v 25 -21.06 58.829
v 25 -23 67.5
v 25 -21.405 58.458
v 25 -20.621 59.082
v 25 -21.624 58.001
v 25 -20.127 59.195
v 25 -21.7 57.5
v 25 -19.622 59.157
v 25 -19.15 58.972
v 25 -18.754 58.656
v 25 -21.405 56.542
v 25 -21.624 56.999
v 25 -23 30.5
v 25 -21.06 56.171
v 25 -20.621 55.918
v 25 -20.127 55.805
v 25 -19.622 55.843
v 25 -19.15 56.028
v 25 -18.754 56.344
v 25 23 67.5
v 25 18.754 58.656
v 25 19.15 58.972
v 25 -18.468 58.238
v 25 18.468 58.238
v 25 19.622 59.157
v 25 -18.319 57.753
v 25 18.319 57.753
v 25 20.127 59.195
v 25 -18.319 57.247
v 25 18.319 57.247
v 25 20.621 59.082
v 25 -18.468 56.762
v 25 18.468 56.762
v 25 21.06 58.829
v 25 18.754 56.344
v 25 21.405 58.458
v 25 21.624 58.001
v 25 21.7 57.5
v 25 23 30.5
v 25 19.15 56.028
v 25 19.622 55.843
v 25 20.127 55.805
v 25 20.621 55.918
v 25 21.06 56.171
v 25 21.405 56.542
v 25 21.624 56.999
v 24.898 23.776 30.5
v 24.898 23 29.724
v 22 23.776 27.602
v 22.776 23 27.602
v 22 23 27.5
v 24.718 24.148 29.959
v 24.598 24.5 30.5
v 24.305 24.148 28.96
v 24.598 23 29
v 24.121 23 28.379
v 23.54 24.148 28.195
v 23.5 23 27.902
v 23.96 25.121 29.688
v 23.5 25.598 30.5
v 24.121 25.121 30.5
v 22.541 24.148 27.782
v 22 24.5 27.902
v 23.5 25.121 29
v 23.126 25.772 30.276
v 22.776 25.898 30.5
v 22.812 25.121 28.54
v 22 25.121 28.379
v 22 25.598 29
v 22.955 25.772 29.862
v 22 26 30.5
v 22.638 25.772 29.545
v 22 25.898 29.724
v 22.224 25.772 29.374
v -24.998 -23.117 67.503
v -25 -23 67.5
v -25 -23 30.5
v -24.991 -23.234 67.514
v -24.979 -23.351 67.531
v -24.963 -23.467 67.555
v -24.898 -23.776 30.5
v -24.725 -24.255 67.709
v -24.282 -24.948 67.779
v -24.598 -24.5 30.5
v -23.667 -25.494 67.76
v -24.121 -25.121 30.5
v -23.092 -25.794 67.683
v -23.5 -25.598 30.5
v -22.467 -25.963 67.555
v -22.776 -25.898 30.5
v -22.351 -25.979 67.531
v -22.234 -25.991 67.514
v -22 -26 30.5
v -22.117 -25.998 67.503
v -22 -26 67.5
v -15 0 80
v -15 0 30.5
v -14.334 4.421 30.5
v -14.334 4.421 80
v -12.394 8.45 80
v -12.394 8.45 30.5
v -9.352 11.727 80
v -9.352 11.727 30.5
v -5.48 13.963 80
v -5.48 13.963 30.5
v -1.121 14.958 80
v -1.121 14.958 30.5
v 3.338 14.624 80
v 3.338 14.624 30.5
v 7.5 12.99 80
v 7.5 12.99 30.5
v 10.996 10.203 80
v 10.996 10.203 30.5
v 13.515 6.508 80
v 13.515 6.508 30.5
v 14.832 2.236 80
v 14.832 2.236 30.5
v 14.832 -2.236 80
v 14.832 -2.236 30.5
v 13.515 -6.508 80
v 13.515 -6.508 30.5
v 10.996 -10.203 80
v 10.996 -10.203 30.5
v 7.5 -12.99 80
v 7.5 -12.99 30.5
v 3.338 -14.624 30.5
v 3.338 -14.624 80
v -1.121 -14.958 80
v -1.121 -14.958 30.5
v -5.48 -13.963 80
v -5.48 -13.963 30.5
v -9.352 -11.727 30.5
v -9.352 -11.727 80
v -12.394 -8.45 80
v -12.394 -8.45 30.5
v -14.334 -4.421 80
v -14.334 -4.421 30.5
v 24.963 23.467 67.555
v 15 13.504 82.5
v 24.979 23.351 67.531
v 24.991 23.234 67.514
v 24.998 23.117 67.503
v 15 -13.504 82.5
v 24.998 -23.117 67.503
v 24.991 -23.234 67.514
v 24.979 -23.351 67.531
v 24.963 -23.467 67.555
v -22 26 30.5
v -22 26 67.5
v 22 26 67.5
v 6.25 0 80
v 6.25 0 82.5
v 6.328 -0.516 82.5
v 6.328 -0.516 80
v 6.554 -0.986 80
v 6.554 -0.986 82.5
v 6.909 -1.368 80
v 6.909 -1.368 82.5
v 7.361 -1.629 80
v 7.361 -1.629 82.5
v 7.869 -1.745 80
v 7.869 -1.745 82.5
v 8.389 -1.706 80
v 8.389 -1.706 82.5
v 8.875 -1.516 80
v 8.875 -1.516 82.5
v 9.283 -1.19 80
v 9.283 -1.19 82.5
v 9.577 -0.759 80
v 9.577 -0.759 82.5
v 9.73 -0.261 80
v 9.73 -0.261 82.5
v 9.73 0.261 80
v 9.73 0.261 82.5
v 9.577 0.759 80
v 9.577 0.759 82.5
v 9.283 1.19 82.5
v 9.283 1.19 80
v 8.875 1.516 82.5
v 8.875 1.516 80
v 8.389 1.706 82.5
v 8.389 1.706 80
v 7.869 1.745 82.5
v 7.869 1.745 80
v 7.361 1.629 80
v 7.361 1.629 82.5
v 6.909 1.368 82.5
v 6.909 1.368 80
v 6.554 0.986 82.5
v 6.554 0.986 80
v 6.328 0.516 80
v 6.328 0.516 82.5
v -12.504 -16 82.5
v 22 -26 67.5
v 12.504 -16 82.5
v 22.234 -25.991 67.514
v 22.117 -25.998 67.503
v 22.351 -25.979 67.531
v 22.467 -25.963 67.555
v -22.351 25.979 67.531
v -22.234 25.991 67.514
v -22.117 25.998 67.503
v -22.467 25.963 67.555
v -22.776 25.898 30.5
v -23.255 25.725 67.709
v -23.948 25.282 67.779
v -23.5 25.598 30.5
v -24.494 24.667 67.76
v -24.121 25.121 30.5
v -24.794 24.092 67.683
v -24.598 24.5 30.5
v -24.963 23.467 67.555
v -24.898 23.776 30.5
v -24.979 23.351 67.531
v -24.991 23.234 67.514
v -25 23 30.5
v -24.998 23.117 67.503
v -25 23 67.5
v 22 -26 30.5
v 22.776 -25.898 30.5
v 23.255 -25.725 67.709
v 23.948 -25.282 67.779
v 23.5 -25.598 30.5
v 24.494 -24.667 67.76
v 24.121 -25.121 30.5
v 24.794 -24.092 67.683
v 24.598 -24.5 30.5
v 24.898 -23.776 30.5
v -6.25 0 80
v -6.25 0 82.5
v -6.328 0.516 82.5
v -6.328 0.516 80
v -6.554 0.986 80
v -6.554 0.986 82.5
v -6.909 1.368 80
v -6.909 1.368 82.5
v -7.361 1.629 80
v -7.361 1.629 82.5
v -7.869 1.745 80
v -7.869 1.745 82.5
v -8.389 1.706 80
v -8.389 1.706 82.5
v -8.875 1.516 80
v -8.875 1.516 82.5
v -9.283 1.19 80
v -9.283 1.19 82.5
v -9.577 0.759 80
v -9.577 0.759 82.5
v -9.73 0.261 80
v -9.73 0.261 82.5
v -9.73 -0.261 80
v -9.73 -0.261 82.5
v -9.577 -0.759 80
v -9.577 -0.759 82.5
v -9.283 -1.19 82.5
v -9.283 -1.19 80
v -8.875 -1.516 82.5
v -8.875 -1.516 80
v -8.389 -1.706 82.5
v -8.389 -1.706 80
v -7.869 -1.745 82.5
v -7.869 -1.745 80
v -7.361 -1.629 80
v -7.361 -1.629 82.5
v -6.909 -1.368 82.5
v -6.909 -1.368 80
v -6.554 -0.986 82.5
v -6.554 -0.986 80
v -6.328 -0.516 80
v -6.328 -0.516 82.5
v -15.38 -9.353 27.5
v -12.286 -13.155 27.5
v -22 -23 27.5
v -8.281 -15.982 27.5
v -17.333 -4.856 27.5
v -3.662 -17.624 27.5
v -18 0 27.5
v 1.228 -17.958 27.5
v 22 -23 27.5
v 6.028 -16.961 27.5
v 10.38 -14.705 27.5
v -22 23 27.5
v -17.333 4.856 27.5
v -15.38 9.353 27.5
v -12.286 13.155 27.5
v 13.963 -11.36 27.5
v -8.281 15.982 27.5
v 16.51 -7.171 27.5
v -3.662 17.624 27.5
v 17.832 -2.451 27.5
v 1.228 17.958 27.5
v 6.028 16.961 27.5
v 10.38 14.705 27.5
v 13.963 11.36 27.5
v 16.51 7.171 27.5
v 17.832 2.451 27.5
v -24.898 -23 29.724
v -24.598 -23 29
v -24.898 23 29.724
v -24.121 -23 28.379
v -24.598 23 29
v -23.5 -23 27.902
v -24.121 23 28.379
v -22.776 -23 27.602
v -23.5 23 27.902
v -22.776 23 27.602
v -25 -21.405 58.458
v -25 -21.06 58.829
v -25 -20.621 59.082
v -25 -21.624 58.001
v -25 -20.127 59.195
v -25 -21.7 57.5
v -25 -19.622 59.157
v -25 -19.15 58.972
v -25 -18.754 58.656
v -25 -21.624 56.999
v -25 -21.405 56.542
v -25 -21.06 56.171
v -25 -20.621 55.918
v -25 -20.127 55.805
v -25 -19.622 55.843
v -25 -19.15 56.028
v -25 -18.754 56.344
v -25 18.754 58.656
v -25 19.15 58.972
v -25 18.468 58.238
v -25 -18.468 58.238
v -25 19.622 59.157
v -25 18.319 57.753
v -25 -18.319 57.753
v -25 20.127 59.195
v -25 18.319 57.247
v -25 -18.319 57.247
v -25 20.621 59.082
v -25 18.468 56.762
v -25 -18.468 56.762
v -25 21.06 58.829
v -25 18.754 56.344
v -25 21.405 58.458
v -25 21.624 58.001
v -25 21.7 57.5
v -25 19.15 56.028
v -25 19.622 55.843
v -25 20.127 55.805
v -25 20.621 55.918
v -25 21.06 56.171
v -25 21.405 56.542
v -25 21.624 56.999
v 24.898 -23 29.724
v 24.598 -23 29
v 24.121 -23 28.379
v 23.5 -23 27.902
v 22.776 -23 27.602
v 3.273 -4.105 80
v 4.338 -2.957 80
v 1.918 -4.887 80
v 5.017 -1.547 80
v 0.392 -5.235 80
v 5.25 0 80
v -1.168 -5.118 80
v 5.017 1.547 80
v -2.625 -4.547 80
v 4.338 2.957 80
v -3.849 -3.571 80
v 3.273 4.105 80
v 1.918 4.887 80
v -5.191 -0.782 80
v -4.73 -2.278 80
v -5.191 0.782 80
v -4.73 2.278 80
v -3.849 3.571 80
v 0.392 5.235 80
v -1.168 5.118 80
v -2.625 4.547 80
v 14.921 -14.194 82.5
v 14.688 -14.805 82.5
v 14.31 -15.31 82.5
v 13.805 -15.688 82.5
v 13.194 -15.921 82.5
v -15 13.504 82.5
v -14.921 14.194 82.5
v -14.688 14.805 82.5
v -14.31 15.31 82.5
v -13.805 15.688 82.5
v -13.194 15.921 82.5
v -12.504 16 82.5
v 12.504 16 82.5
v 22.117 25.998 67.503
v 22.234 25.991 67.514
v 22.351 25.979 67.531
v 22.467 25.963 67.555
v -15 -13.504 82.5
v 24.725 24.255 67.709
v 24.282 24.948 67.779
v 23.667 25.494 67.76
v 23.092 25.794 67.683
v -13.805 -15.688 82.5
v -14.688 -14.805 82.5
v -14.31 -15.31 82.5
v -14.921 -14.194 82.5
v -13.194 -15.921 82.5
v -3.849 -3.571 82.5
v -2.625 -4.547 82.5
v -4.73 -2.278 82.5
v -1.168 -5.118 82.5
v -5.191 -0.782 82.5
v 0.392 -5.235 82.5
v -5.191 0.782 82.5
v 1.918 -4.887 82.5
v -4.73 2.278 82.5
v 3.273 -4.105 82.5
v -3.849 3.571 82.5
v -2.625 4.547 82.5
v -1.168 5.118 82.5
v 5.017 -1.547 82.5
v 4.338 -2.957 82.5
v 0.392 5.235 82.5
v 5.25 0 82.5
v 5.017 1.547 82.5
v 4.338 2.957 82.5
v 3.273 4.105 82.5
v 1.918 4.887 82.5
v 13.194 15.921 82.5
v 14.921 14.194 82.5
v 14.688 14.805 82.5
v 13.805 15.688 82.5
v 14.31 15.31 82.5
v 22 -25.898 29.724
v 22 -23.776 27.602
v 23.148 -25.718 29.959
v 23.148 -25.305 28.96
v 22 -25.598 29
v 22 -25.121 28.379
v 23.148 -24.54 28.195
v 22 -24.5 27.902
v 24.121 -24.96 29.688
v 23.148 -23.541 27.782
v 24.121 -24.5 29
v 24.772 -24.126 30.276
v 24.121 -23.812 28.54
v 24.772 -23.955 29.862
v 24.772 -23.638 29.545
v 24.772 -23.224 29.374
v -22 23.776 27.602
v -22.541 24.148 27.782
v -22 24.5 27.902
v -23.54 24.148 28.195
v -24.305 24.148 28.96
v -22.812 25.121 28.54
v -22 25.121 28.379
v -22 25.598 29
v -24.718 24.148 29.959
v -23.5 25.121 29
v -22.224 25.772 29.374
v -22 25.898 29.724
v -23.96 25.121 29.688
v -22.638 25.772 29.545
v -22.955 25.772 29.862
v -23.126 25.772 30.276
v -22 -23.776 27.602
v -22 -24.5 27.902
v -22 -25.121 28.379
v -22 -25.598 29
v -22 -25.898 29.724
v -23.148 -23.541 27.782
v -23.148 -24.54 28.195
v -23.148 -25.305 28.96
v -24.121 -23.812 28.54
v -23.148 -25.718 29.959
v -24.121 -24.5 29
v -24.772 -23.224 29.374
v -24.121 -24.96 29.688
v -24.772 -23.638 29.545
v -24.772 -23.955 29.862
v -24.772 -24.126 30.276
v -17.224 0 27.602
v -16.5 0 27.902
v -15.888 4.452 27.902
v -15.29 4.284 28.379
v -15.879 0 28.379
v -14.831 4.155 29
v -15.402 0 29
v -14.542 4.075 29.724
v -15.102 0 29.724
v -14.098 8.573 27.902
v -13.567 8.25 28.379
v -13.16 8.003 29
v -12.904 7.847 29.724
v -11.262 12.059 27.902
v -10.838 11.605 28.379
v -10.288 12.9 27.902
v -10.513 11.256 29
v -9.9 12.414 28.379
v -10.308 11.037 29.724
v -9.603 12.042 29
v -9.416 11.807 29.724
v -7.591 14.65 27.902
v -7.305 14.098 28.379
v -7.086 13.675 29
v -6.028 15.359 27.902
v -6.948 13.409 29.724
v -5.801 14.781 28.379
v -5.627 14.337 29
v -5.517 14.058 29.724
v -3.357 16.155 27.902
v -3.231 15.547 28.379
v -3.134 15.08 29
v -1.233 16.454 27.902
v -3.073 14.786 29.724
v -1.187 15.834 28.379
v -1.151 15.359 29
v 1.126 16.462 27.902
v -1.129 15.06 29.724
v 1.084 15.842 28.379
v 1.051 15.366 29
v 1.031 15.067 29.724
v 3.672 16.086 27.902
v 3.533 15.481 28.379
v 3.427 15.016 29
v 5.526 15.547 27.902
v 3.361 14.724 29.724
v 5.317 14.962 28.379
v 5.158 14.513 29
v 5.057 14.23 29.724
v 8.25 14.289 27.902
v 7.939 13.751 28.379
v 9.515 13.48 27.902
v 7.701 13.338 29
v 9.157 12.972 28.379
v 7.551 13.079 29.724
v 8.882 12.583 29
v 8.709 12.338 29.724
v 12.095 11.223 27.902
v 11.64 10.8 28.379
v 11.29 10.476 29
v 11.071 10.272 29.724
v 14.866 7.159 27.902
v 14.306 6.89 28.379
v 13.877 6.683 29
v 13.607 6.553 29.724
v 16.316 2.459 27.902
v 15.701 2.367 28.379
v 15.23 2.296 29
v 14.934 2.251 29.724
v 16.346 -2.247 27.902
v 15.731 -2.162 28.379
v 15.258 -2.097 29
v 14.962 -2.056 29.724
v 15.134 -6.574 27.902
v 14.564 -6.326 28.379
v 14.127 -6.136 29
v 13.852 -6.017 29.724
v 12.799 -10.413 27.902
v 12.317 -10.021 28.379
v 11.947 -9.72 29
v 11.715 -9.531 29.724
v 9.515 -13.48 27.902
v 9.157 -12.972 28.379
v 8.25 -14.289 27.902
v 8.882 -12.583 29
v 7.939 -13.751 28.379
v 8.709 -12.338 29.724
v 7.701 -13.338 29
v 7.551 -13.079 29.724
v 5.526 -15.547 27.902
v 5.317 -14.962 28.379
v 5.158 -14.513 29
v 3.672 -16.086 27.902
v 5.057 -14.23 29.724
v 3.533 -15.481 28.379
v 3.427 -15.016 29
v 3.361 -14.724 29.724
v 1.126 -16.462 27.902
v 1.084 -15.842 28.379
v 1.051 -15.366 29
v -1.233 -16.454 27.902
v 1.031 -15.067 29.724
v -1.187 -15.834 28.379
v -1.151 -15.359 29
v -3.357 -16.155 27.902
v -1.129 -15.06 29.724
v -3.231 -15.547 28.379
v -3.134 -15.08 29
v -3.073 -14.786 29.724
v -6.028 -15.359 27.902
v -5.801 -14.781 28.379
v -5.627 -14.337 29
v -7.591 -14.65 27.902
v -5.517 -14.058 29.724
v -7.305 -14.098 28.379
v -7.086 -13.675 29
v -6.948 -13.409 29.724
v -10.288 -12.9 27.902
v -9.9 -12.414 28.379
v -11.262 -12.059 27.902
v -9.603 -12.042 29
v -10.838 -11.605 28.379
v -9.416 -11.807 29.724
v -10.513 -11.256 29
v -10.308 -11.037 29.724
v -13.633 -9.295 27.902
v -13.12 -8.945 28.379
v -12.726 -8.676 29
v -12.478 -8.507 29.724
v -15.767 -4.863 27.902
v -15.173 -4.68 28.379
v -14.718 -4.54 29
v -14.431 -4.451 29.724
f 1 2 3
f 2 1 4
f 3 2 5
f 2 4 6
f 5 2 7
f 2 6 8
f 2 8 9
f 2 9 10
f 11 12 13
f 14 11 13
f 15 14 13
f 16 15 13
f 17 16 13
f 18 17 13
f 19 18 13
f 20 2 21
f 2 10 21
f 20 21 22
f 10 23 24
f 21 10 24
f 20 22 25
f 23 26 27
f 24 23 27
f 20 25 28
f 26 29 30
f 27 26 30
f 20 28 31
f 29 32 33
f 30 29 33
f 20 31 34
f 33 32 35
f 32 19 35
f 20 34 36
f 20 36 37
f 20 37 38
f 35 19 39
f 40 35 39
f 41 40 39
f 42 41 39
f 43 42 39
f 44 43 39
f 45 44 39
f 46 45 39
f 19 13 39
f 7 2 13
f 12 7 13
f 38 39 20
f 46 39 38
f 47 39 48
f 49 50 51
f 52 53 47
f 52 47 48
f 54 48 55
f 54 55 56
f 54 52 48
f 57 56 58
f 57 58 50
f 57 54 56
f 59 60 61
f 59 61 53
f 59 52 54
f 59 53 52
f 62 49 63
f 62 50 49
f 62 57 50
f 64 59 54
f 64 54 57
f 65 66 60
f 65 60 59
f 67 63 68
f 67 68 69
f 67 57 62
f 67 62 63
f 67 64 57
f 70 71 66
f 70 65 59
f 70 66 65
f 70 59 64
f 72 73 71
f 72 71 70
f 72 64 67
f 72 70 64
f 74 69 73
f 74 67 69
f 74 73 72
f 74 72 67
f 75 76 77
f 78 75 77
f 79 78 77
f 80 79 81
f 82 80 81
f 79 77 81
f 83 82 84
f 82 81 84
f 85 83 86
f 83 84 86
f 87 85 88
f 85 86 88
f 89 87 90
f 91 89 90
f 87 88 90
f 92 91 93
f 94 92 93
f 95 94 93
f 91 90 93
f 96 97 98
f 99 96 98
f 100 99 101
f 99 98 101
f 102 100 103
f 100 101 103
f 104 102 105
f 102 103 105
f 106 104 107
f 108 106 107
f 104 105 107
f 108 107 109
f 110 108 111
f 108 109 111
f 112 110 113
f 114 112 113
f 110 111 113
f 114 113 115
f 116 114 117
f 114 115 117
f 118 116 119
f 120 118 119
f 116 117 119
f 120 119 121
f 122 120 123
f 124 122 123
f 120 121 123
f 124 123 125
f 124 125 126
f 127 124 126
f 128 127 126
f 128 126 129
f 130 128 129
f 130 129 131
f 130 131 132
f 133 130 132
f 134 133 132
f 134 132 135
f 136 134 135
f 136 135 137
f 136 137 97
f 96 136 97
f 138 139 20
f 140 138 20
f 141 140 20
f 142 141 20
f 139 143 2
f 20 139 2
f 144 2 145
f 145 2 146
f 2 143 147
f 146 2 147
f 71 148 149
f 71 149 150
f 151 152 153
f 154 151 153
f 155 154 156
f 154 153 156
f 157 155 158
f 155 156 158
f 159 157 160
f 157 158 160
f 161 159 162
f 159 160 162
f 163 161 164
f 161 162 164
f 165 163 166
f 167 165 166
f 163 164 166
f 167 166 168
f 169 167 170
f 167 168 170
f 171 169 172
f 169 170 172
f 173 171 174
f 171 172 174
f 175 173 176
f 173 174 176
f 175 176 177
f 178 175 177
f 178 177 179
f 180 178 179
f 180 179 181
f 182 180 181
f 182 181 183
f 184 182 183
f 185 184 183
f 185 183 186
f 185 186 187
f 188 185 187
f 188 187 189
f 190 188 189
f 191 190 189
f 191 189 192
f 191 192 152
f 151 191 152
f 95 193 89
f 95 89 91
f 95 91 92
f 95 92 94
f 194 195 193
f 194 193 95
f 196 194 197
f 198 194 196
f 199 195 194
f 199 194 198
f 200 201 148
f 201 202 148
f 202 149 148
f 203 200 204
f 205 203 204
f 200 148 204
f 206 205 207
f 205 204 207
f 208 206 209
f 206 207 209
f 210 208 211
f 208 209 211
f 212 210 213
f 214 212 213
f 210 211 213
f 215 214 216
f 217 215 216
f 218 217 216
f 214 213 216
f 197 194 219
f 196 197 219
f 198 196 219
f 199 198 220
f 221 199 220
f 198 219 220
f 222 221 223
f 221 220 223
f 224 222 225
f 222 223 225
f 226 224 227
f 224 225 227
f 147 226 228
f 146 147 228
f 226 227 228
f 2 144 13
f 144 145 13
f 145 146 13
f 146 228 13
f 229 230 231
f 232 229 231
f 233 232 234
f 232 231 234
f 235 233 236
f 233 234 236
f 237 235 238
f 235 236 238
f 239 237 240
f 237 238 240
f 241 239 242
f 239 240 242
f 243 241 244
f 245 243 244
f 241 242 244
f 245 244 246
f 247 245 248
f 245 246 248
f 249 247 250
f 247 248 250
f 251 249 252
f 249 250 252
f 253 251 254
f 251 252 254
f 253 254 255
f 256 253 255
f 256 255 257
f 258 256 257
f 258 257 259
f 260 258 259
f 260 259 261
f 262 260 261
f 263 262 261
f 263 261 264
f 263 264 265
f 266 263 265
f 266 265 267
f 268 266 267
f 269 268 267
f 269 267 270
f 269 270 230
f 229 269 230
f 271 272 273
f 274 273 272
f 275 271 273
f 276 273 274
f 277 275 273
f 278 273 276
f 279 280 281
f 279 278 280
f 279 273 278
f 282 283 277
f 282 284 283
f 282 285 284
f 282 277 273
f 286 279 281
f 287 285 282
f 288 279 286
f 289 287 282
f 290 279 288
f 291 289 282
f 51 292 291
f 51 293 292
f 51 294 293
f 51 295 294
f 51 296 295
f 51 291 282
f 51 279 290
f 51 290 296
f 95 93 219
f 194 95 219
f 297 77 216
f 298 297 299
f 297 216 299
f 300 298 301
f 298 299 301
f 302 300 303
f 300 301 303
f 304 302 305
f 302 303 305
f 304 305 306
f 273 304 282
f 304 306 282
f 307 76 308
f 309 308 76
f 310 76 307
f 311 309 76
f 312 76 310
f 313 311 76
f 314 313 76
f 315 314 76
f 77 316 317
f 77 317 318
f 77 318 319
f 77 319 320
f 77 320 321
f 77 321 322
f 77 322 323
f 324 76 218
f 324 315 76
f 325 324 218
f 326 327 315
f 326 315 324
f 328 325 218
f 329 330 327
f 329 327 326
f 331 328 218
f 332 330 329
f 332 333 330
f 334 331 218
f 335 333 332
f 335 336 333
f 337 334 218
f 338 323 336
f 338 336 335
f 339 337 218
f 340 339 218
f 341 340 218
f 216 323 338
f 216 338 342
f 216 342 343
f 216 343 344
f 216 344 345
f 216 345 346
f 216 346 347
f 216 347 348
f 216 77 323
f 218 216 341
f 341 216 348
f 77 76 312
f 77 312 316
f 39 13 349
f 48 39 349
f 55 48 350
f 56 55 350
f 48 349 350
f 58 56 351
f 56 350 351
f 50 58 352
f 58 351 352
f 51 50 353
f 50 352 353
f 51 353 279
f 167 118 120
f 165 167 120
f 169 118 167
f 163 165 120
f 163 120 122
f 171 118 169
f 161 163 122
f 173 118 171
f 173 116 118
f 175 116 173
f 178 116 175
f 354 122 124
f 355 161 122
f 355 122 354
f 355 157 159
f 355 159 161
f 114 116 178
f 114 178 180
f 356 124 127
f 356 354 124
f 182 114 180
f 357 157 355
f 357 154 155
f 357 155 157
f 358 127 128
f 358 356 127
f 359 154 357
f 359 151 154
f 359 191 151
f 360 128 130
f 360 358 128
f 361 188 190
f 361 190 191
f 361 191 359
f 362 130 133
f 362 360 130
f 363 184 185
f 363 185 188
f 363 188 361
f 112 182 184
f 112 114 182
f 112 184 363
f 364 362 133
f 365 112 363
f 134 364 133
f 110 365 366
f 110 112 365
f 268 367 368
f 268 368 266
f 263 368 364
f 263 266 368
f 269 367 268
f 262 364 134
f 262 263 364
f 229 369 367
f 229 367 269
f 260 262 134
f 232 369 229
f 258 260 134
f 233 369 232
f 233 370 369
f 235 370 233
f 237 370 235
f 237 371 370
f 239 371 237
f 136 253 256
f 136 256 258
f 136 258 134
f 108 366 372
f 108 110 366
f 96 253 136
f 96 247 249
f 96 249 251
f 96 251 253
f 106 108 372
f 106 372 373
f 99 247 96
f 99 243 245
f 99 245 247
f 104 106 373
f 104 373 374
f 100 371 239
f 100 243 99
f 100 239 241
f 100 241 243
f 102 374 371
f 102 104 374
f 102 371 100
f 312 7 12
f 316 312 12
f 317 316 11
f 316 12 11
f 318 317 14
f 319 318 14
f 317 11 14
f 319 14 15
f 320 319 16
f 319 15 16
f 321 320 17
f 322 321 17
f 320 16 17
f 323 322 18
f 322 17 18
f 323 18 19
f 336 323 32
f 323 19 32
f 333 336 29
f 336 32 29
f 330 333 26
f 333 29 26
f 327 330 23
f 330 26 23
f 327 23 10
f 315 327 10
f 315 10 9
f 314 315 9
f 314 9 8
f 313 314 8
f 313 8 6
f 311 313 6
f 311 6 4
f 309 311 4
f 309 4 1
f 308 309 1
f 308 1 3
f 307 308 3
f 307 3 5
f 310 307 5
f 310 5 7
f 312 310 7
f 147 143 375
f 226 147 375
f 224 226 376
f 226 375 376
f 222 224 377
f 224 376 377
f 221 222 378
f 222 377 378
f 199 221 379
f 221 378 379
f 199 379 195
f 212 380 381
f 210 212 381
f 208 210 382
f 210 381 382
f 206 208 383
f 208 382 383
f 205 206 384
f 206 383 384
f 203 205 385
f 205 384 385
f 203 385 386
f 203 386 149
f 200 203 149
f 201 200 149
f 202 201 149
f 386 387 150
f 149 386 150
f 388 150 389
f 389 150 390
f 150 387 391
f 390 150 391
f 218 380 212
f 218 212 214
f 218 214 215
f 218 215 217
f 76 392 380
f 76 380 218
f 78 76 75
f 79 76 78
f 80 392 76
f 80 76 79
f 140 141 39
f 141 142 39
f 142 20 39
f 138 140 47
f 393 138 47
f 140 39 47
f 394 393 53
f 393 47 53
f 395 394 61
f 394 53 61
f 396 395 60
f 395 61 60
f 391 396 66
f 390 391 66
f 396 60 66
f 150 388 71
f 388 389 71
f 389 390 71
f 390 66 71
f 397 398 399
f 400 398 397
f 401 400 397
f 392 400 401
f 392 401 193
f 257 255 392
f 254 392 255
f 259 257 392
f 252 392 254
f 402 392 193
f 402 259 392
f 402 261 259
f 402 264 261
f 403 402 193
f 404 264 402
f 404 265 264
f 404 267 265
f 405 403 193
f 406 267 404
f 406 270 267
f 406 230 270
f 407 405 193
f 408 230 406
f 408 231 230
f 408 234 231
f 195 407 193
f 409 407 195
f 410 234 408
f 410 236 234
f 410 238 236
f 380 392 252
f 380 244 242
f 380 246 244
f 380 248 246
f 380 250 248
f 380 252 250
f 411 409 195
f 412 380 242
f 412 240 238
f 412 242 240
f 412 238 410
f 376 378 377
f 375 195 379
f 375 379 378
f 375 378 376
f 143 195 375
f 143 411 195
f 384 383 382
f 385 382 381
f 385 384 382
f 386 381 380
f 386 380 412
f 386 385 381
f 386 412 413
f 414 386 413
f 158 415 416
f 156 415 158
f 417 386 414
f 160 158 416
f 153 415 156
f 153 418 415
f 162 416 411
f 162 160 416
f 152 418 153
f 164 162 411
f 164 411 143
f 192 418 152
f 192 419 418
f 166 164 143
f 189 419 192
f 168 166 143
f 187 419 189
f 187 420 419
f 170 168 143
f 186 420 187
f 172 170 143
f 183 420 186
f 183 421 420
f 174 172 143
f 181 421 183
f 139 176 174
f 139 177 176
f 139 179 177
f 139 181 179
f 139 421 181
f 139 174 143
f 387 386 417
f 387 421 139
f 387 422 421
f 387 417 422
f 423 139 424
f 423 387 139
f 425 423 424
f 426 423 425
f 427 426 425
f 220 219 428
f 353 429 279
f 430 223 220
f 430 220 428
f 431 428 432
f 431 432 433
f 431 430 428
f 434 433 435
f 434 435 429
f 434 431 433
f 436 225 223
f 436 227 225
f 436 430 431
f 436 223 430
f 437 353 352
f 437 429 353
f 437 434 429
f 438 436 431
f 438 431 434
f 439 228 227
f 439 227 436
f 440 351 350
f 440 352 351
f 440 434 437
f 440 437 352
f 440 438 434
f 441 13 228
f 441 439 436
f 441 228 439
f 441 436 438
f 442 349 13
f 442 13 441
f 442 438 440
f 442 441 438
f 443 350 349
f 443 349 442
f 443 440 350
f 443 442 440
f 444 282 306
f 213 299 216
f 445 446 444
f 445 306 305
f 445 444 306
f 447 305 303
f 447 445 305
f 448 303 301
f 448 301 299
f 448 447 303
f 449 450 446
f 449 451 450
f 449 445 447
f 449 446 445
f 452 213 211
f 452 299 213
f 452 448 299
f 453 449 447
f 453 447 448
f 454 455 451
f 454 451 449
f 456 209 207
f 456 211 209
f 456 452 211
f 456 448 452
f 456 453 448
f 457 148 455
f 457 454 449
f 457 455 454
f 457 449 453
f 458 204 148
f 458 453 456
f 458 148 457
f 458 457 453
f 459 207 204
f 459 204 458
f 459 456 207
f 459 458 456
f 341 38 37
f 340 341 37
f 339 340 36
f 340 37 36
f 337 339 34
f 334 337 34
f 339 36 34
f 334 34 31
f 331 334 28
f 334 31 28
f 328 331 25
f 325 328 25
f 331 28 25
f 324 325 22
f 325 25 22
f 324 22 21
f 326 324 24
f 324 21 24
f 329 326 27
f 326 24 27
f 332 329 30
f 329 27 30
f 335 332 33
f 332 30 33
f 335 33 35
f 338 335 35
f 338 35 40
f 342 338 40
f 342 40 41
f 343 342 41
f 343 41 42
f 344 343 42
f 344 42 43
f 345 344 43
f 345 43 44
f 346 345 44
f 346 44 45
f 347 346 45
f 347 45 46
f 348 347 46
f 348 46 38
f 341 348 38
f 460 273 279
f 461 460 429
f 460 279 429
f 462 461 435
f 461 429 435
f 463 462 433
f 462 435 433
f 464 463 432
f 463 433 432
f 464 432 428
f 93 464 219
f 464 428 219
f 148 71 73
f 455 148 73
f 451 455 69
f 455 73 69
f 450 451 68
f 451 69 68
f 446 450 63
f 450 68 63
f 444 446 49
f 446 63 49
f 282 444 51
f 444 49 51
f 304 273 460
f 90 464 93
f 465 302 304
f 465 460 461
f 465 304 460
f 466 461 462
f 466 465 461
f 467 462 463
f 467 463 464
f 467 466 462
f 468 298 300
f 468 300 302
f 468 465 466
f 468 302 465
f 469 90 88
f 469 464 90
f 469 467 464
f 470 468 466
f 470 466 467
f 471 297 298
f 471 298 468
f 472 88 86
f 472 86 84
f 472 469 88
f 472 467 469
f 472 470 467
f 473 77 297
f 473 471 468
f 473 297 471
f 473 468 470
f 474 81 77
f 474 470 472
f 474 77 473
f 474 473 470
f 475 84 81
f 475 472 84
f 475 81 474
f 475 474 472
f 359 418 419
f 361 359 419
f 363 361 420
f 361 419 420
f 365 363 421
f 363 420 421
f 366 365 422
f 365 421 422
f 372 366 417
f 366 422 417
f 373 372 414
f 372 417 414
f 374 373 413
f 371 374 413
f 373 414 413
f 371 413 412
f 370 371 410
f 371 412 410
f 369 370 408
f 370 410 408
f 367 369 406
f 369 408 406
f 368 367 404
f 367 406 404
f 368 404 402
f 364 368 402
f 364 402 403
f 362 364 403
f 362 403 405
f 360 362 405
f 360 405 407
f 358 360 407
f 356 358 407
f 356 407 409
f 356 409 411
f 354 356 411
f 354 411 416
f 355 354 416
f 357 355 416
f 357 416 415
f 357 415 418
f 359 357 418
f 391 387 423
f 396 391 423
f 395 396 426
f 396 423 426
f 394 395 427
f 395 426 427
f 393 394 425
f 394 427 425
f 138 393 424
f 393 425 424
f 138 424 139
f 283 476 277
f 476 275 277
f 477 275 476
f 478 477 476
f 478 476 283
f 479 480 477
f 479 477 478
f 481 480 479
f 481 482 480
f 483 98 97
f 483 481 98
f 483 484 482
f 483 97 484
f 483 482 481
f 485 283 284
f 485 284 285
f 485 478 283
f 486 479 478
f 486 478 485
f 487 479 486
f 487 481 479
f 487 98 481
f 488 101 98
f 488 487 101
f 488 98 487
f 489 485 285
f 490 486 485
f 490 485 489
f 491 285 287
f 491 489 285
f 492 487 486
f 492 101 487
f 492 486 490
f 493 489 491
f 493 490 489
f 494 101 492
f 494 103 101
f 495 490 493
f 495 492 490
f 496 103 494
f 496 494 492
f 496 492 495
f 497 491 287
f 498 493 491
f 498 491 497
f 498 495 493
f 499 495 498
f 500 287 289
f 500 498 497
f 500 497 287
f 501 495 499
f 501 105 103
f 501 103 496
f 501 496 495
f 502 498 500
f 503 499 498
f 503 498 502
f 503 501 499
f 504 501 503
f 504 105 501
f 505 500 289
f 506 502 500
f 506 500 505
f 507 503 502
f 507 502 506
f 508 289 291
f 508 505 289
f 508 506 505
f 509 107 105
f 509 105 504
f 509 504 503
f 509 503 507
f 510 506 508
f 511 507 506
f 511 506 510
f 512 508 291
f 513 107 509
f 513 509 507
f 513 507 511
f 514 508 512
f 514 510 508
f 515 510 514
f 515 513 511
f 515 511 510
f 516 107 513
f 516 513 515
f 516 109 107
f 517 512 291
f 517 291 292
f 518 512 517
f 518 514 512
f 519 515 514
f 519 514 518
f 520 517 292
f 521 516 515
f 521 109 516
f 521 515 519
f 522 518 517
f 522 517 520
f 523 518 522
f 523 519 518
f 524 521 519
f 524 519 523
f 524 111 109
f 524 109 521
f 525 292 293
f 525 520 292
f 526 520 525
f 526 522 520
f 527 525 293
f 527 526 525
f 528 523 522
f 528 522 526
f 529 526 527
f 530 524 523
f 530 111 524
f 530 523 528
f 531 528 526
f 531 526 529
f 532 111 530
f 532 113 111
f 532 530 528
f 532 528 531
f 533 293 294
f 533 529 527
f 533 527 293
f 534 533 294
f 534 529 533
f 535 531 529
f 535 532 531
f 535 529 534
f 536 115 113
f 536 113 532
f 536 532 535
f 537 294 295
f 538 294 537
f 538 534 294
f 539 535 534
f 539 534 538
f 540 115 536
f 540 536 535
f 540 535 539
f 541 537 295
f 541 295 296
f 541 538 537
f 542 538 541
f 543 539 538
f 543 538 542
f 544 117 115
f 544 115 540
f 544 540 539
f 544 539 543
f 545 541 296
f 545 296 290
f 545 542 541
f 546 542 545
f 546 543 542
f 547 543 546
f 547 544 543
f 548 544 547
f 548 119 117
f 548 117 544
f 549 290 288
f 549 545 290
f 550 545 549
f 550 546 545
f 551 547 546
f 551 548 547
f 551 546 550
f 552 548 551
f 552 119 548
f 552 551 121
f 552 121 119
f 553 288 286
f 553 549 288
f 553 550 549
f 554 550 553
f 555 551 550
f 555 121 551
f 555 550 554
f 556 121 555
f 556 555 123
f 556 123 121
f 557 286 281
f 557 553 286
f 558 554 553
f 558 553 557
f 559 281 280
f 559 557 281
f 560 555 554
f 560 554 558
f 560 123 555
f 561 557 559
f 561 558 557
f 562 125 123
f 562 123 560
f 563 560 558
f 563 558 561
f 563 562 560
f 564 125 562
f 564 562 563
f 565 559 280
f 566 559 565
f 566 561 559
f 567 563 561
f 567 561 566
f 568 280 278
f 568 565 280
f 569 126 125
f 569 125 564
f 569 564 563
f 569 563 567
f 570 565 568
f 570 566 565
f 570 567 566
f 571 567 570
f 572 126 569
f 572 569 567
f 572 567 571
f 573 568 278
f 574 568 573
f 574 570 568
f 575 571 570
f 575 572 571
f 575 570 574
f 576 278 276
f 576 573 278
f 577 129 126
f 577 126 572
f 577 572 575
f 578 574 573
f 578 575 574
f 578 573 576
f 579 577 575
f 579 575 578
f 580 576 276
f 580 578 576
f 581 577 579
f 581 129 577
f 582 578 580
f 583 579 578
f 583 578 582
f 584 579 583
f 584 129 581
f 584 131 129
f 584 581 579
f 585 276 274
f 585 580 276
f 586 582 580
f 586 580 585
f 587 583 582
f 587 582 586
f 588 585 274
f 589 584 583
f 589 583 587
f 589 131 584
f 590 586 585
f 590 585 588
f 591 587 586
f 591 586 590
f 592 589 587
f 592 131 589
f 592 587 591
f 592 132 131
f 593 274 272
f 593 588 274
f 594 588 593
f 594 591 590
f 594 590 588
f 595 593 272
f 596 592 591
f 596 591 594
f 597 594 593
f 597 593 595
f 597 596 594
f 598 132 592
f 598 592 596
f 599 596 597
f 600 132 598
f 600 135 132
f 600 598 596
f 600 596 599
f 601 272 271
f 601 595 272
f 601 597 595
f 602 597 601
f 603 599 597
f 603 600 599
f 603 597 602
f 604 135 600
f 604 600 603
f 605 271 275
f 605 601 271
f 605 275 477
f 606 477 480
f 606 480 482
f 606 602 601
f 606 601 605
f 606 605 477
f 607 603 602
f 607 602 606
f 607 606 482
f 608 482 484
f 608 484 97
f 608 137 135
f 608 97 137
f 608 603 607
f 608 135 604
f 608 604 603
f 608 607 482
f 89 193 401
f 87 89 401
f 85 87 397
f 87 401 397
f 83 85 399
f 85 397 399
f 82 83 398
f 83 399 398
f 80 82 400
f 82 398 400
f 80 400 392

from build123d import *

# Parameters (mm, degrees)
SKETCH1_W           = 50
SKETCH1_H           = 52
BOSS_EXTRUDE1_DEPTH = 82.5
SKETCH2_R           = 15
CUT_EXTRUDE1_DEPTH  = 80
SKETCH3_R           = 5.25
SKETCH3_R_2         = 1.75
CUT_EXTRUDE2_DEPTH  = 91.040268769
SKETCH4_R           = 1.7
CUT_EXTRUDE4_DEPTH  = 100.911210582
SKETCH6_W           = 27.5
SKETCH6_H           = 52
CUT_EXTRUDE5_DEPTH  = 100.911210582
CUT_EXTRUDE6_DEPTH  = 100.911210582
CUT_EXTRUDE7_DEPTH  = 101.673978763
FILLET1_R           = 3


with BuildPart() as part:
    # Sketch1 → Boss-Extrude1 (new body)
    with BuildSketch(Plane.XY):
        Rectangle(SKETCH1_W, SKETCH1_H)
    extrude(amount=BOSS_EXTRUDE1_DEPTH)

    # Sketch2 → Cut-Extrude1 (cut)
    with BuildSketch(Plane(origin=(0, 0, 0), x_dir=(-1, 0, 0), z_dir=(0, 0, -1))):
        Circle(SKETCH2_R)
    extrude(amount=-CUT_EXTRUDE1_DEPTH, mode=Mode.SUBTRACT)

    # Sketch3 → Cut-Extrude2 (cut, through all)
    with BuildSketch(Plane.XY.offset(82.5)):
        Circle(SKETCH3_R)
        with Locations((-8, 0)):
            Circle(SKETCH3_R_2)
        with Locations(Location((8, 0, 0), (0, 0, 180))):
            Circle(SKETCH3_R_2)
    extrude(amount=-CUT_EXTRUDE2_DEPTH, mode=Mode.SUBTRACT)

    # Sketch4 → Cut-Extrude4 (cut, through all)
    with BuildSketch(Plane(origin=(25, 0, 0), x_dir=(0, 0, -1), z_dir=(1, 0, 0))):
        with Locations(Location((-57.5, 20, 0), (0, 0, 90))):
            Circle(SKETCH4_R)
        with Locations(Location((-57.5, -20, 0), (0, 0, 270))):
            Circle(SKETCH4_R)
    extrude(amount=-CUT_EXTRUDE4_DEPTH, mode=Mode.SUBTRACT)

    # Sketch6 → Cut-Extrude5 (cut, through all)
    with BuildSketch(Plane(origin=(25, 0, 0), x_dir=(0, 0, -1), z_dir=(1, 0, 0))):
        with Locations((-13.75, 0)):
            Rectangle(SKETCH6_W, SKETCH6_H)
    extrude(amount=-CUT_EXTRUDE5_DEPTH, mode=Mode.SUBTRACT)

    # Sketch9 → Cut-Extrude6 (cut, through all)
    with BuildSketch(Plane(origin=(25, 0, 0), x_dir=(0, 0, -1), z_dir=(1, 0, 0))):
        Polygon((-82.5, 26), (-82.5, 16), (-67.5, 26), align=None)
        Polygon((-82.5, -16), (-67.5, -26), (-82.5, -26), align=None)
    extrude(amount=-CUT_EXTRUDE6_DEPTH, mode=Mode.SUBTRACT)

    # Sketch10 → Cut-Extrude7 (cut, through all)
    with BuildSketch(Plane.XZ.offset(26)):
        Polygon((15, 82.5), (25, 67.5), (25, 82.5), align=None)
        Polygon((-25, 67.5), (-25, 82.5), (-15, 82.5), align=None)
    extrude(amount=-CUT_EXTRUDE7_DEPTH, mode=Mode.SUBTRACT)

    # Fillet1
    # the kernel refuses this fillet: 3 mm, written as the material it takes off along each edge
    with BuildSketch(Plane(origin=(-22, 23, 30.5), x_dir=(-1, 0, 0), z_dir=(0, 1, 0))) as fillet1_piece_1_section:
        Polygon((0, 0), (FILLET1_R, 0), (FILLET1_R, -FILLET1_R), (0, -FILLET1_R), align=None)
    fillet1_piece_1 = extrude(amount=FILLET1_R, mode=Mode.PRIVATE)
    fillet1_piece_1 = fillet1_piece_1 - Plane(origin=(-22, 23, 30.5), x_dir=(0.7071067811865475, 0, 0.7071067811865475), z_dir=(0, 1, 0)) * Sphere(FILLET1_R, mode=Mode.PRIVATE)
    add(fillet1_piece_1, mode=Mode.SUBTRACT)
    with BuildSketch(Plane(origin=(-22, -23, 30.5), x_dir=(0, 0, -1), z_dir=(-1, 0, 0))) as fillet1_piece_2_section:
        Polygon((0, 0), (FILLET1_R, 0), (FILLET1_R, FILLET1_R), (0, FILLET1_R), align=None)
    fillet1_piece_2 = extrude(amount=FILLET1_R, mode=Mode.PRIVATE)
    fillet1_piece_2 = fillet1_piece_2 - Plane(origin=(-22, -23, 30.5), x_dir=(0, 0.7071067811865475, 0.7071067811865475), z_dir=(-1, 0, 0)) * Sphere(FILLET1_R, mode=Mode.PRIVATE)
    add(fillet1_piece_2, mode=Mode.SUBTRACT)
    with BuildSketch(Plane(origin=(22, -23, 30.5), x_dir=(0, 0, -1), z_dir=(1, 0, 0))) as fillet1_piece_3_section:
        Polygon((0, 0), (FILLET1_R, 0), (FILLET1_R, -FILLET1_R), (0, -FILLET1_R), align=None)
    fillet1_piece_3 = extrude(amount=FILLET1_R, mode=Mode.PRIVATE)
    fillet1_piece_3 = fillet1_piece_3 - Plane(origin=(22, -23, 30.5), x_dir=(0, 0.7071067811865475, 0.7071067811865475), z_dir=(1, 0, 0)) * Sphere(FILLET1_R, mode=Mode.PRIVATE)
    add(fillet1_piece_3, mode=Mode.SUBTRACT)
    with BuildSketch(Plane(origin=(22, 23, 30.5), x_dir=(1, 0, 0), z_dir=(0, 1, 0))) as fillet1_piece_4_section:
        Polygon((0, 0), (FILLET1_R, 0), (FILLET1_R, FILLET1_R), (0, FILLET1_R), align=None)
    fillet1_piece_4 = extrude(amount=FILLET1_R, mode=Mode.PRIVATE)
    fillet1_piece_4 = fillet1_piece_4 - Plane(origin=(22, 23, 30.5), x_dir=(-0.7071067811865475, 0, 0.7071067811865475), z_dir=(0, 1, 0)) * Sphere(FILLET1_R, mode=Mode.PRIVATE)
    add(fillet1_piece_4, mode=Mode.SUBTRACT)
    with BuildSketch(Plane(origin=(12.352941176, -13.352941176, 86.470588235), x_dir=(0.26906911759852636, 0.8744746321952062, -0.40360367639778677), z_dir=(0.4850712500726659, -0.4850712500726661, -0.7276068751089989)), Plane(origin=(12.352941176, 13.352941176, 86.470588235), x_dir=(-0.8744746321952062, 0.26906911759852264, -0.4036036763977888), z_dir=(0.4850712500726658, 0.48507125007266627, -0.7276068751089988))) as fillet1_piece_5:
        with BuildLine():
            CenterArc((FILLET1_R * 0.727606875109, -FILLET1_R), FILLET1_R, 90, 72.079786861)
            Line((-FILLET1_R * 0.223879038495, -FILLET1_R * 0.692307692308), (0, 0))
            Line((0, 0), (FILLET1_R * 0.727606875109, 0))
        make_face()
    extrude(amount=31.529631255, mode=Mode.SUBTRACT)
    with BuildSketch(Plane(origin=(-12.352941176, -13.352941176, 86.470588235), x_dir=(-0.26906911759852215, 0.8744746321952062, -0.4036036763977897), z_dir=(-0.485071250072666, -0.48507125007266627, -0.7276068751089988)), Plane(origin=(-12.352941176, 13.352941176, 86.470588235), x_dir=(0.8744746321952063, 0.2690691175985245, -0.40360367639778794), z_dir=(-0.485071250072666, 0.48507125007266605, -0.7276068751089988))) as fillet1_piece_6:
        with BuildLine():
            CenterArc((FILLET1_R * 0.727606875109, FILLET1_R), FILLET1_R, 197.920213139, 72.079786861)
            Line((-FILLET1_R * 0.223879038495, FILLET1_R * 0.692307692308), (0, 0))
            Line((0, 0), (FILLET1_R * 0.727606875109, 0))
        make_face()
    extrude(amount=31.529631255, mode=Mode.SUBTRACT)
    with BuildSketch(Plane(origin=(-25, 23, 27.5), x_dir=(0, 0, 1), z_dir=(0, -1, 0)), Plane(origin=(25, -23, 27.5), x_dir=(0, 0, 1), z_dir=(0, 1, 0))) as fillet1_piece_7:
        with BuildLine():
            CenterArc((FILLET1_R, -FILLET1_R), FILLET1_R, 90, 90)
            Line((0, -FILLET1_R), (0, 0))
            Line((0, 0), (FILLET1_R, 0))
        make_face()
    extrude(amount=46, mode=Mode.SUBTRACT)
    with BuildSketch(Plane(origin=(22, -26, 27.5), x_dir=(0, 1, 0), z_dir=(-1, 0, 0)), Plane(origin=(22, 26, 27.5), x_dir=(0, 0, 1), z_dir=(-1, 0, 0))) as fillet1_piece_8:
        with BuildLine():
            CenterArc((FILLET1_R, -FILLET1_R), FILLET1_R, 90, 90)
            Line((0, -FILLET1_R), (0, 0))
            Line((0, 0), (FILLET1_R, 0))
        make_face()
    extrude(amount=44, mode=Mode.SUBTRACT)
    with BuildSketch(Plane(origin=(0, 0, 27.5), x_dir=(-1, 0, 0), z_dir=(0, -1, 0))) as fillet1_piece_9:
        with BuildLine():
            CenterArc((15 + FILLET1_R, -FILLET1_R), FILLET1_R, 90, 90)
            Line((15, -FILLET1_R), (15, 0))
            Line((15, 0), (15 + FILLET1_R, 0))
        make_face()
    revolve(axis=Axis((0, 0, 27.5), (0, 0, -1)), mode=Mode.SUBTRACT)
    with BuildSketch(Plane(origin=(-25, -26, 30.5), x_dir=(0, 1, 0), z_dir=(0, 0, 1)), Plane(origin=(-25, 26, 30.5), x_dir=(1, 0, 0), z_dir=(0, 0, 1))) as fillet1_piece_10:
        with BuildLine():
            CenterArc((FILLET1_R, -FILLET1_R), FILLET1_R, 90, 90)
            Line((0, -FILLET1_R), (0, 0))
            Line((0, 0), (FILLET1_R, 0))
        make_face()
    extrude(amount=44.5, mode=Mode.SUBTRACT)
    with BuildSketch(Plane(origin=(25, -26, 30.5), x_dir=(0, 1, 0), z_dir=(0, 0, 1)), Plane(origin=(25, 26, 30.5), x_dir=(-1, 0, 0), z_dir=(0, 0, 1))) as fillet1_piece_11:
        with BuildLine():
            CenterArc((FILLET1_R, FILLET1_R), FILLET1_R, 180, 90)
            Line((0, FILLET1_R), (0, 0))
            Line((0, 0), (FILLET1_R, 0))
        make_face()
    extrude(amount=44.5, mode=Mode.SUBTRACT)


solid = part.part
